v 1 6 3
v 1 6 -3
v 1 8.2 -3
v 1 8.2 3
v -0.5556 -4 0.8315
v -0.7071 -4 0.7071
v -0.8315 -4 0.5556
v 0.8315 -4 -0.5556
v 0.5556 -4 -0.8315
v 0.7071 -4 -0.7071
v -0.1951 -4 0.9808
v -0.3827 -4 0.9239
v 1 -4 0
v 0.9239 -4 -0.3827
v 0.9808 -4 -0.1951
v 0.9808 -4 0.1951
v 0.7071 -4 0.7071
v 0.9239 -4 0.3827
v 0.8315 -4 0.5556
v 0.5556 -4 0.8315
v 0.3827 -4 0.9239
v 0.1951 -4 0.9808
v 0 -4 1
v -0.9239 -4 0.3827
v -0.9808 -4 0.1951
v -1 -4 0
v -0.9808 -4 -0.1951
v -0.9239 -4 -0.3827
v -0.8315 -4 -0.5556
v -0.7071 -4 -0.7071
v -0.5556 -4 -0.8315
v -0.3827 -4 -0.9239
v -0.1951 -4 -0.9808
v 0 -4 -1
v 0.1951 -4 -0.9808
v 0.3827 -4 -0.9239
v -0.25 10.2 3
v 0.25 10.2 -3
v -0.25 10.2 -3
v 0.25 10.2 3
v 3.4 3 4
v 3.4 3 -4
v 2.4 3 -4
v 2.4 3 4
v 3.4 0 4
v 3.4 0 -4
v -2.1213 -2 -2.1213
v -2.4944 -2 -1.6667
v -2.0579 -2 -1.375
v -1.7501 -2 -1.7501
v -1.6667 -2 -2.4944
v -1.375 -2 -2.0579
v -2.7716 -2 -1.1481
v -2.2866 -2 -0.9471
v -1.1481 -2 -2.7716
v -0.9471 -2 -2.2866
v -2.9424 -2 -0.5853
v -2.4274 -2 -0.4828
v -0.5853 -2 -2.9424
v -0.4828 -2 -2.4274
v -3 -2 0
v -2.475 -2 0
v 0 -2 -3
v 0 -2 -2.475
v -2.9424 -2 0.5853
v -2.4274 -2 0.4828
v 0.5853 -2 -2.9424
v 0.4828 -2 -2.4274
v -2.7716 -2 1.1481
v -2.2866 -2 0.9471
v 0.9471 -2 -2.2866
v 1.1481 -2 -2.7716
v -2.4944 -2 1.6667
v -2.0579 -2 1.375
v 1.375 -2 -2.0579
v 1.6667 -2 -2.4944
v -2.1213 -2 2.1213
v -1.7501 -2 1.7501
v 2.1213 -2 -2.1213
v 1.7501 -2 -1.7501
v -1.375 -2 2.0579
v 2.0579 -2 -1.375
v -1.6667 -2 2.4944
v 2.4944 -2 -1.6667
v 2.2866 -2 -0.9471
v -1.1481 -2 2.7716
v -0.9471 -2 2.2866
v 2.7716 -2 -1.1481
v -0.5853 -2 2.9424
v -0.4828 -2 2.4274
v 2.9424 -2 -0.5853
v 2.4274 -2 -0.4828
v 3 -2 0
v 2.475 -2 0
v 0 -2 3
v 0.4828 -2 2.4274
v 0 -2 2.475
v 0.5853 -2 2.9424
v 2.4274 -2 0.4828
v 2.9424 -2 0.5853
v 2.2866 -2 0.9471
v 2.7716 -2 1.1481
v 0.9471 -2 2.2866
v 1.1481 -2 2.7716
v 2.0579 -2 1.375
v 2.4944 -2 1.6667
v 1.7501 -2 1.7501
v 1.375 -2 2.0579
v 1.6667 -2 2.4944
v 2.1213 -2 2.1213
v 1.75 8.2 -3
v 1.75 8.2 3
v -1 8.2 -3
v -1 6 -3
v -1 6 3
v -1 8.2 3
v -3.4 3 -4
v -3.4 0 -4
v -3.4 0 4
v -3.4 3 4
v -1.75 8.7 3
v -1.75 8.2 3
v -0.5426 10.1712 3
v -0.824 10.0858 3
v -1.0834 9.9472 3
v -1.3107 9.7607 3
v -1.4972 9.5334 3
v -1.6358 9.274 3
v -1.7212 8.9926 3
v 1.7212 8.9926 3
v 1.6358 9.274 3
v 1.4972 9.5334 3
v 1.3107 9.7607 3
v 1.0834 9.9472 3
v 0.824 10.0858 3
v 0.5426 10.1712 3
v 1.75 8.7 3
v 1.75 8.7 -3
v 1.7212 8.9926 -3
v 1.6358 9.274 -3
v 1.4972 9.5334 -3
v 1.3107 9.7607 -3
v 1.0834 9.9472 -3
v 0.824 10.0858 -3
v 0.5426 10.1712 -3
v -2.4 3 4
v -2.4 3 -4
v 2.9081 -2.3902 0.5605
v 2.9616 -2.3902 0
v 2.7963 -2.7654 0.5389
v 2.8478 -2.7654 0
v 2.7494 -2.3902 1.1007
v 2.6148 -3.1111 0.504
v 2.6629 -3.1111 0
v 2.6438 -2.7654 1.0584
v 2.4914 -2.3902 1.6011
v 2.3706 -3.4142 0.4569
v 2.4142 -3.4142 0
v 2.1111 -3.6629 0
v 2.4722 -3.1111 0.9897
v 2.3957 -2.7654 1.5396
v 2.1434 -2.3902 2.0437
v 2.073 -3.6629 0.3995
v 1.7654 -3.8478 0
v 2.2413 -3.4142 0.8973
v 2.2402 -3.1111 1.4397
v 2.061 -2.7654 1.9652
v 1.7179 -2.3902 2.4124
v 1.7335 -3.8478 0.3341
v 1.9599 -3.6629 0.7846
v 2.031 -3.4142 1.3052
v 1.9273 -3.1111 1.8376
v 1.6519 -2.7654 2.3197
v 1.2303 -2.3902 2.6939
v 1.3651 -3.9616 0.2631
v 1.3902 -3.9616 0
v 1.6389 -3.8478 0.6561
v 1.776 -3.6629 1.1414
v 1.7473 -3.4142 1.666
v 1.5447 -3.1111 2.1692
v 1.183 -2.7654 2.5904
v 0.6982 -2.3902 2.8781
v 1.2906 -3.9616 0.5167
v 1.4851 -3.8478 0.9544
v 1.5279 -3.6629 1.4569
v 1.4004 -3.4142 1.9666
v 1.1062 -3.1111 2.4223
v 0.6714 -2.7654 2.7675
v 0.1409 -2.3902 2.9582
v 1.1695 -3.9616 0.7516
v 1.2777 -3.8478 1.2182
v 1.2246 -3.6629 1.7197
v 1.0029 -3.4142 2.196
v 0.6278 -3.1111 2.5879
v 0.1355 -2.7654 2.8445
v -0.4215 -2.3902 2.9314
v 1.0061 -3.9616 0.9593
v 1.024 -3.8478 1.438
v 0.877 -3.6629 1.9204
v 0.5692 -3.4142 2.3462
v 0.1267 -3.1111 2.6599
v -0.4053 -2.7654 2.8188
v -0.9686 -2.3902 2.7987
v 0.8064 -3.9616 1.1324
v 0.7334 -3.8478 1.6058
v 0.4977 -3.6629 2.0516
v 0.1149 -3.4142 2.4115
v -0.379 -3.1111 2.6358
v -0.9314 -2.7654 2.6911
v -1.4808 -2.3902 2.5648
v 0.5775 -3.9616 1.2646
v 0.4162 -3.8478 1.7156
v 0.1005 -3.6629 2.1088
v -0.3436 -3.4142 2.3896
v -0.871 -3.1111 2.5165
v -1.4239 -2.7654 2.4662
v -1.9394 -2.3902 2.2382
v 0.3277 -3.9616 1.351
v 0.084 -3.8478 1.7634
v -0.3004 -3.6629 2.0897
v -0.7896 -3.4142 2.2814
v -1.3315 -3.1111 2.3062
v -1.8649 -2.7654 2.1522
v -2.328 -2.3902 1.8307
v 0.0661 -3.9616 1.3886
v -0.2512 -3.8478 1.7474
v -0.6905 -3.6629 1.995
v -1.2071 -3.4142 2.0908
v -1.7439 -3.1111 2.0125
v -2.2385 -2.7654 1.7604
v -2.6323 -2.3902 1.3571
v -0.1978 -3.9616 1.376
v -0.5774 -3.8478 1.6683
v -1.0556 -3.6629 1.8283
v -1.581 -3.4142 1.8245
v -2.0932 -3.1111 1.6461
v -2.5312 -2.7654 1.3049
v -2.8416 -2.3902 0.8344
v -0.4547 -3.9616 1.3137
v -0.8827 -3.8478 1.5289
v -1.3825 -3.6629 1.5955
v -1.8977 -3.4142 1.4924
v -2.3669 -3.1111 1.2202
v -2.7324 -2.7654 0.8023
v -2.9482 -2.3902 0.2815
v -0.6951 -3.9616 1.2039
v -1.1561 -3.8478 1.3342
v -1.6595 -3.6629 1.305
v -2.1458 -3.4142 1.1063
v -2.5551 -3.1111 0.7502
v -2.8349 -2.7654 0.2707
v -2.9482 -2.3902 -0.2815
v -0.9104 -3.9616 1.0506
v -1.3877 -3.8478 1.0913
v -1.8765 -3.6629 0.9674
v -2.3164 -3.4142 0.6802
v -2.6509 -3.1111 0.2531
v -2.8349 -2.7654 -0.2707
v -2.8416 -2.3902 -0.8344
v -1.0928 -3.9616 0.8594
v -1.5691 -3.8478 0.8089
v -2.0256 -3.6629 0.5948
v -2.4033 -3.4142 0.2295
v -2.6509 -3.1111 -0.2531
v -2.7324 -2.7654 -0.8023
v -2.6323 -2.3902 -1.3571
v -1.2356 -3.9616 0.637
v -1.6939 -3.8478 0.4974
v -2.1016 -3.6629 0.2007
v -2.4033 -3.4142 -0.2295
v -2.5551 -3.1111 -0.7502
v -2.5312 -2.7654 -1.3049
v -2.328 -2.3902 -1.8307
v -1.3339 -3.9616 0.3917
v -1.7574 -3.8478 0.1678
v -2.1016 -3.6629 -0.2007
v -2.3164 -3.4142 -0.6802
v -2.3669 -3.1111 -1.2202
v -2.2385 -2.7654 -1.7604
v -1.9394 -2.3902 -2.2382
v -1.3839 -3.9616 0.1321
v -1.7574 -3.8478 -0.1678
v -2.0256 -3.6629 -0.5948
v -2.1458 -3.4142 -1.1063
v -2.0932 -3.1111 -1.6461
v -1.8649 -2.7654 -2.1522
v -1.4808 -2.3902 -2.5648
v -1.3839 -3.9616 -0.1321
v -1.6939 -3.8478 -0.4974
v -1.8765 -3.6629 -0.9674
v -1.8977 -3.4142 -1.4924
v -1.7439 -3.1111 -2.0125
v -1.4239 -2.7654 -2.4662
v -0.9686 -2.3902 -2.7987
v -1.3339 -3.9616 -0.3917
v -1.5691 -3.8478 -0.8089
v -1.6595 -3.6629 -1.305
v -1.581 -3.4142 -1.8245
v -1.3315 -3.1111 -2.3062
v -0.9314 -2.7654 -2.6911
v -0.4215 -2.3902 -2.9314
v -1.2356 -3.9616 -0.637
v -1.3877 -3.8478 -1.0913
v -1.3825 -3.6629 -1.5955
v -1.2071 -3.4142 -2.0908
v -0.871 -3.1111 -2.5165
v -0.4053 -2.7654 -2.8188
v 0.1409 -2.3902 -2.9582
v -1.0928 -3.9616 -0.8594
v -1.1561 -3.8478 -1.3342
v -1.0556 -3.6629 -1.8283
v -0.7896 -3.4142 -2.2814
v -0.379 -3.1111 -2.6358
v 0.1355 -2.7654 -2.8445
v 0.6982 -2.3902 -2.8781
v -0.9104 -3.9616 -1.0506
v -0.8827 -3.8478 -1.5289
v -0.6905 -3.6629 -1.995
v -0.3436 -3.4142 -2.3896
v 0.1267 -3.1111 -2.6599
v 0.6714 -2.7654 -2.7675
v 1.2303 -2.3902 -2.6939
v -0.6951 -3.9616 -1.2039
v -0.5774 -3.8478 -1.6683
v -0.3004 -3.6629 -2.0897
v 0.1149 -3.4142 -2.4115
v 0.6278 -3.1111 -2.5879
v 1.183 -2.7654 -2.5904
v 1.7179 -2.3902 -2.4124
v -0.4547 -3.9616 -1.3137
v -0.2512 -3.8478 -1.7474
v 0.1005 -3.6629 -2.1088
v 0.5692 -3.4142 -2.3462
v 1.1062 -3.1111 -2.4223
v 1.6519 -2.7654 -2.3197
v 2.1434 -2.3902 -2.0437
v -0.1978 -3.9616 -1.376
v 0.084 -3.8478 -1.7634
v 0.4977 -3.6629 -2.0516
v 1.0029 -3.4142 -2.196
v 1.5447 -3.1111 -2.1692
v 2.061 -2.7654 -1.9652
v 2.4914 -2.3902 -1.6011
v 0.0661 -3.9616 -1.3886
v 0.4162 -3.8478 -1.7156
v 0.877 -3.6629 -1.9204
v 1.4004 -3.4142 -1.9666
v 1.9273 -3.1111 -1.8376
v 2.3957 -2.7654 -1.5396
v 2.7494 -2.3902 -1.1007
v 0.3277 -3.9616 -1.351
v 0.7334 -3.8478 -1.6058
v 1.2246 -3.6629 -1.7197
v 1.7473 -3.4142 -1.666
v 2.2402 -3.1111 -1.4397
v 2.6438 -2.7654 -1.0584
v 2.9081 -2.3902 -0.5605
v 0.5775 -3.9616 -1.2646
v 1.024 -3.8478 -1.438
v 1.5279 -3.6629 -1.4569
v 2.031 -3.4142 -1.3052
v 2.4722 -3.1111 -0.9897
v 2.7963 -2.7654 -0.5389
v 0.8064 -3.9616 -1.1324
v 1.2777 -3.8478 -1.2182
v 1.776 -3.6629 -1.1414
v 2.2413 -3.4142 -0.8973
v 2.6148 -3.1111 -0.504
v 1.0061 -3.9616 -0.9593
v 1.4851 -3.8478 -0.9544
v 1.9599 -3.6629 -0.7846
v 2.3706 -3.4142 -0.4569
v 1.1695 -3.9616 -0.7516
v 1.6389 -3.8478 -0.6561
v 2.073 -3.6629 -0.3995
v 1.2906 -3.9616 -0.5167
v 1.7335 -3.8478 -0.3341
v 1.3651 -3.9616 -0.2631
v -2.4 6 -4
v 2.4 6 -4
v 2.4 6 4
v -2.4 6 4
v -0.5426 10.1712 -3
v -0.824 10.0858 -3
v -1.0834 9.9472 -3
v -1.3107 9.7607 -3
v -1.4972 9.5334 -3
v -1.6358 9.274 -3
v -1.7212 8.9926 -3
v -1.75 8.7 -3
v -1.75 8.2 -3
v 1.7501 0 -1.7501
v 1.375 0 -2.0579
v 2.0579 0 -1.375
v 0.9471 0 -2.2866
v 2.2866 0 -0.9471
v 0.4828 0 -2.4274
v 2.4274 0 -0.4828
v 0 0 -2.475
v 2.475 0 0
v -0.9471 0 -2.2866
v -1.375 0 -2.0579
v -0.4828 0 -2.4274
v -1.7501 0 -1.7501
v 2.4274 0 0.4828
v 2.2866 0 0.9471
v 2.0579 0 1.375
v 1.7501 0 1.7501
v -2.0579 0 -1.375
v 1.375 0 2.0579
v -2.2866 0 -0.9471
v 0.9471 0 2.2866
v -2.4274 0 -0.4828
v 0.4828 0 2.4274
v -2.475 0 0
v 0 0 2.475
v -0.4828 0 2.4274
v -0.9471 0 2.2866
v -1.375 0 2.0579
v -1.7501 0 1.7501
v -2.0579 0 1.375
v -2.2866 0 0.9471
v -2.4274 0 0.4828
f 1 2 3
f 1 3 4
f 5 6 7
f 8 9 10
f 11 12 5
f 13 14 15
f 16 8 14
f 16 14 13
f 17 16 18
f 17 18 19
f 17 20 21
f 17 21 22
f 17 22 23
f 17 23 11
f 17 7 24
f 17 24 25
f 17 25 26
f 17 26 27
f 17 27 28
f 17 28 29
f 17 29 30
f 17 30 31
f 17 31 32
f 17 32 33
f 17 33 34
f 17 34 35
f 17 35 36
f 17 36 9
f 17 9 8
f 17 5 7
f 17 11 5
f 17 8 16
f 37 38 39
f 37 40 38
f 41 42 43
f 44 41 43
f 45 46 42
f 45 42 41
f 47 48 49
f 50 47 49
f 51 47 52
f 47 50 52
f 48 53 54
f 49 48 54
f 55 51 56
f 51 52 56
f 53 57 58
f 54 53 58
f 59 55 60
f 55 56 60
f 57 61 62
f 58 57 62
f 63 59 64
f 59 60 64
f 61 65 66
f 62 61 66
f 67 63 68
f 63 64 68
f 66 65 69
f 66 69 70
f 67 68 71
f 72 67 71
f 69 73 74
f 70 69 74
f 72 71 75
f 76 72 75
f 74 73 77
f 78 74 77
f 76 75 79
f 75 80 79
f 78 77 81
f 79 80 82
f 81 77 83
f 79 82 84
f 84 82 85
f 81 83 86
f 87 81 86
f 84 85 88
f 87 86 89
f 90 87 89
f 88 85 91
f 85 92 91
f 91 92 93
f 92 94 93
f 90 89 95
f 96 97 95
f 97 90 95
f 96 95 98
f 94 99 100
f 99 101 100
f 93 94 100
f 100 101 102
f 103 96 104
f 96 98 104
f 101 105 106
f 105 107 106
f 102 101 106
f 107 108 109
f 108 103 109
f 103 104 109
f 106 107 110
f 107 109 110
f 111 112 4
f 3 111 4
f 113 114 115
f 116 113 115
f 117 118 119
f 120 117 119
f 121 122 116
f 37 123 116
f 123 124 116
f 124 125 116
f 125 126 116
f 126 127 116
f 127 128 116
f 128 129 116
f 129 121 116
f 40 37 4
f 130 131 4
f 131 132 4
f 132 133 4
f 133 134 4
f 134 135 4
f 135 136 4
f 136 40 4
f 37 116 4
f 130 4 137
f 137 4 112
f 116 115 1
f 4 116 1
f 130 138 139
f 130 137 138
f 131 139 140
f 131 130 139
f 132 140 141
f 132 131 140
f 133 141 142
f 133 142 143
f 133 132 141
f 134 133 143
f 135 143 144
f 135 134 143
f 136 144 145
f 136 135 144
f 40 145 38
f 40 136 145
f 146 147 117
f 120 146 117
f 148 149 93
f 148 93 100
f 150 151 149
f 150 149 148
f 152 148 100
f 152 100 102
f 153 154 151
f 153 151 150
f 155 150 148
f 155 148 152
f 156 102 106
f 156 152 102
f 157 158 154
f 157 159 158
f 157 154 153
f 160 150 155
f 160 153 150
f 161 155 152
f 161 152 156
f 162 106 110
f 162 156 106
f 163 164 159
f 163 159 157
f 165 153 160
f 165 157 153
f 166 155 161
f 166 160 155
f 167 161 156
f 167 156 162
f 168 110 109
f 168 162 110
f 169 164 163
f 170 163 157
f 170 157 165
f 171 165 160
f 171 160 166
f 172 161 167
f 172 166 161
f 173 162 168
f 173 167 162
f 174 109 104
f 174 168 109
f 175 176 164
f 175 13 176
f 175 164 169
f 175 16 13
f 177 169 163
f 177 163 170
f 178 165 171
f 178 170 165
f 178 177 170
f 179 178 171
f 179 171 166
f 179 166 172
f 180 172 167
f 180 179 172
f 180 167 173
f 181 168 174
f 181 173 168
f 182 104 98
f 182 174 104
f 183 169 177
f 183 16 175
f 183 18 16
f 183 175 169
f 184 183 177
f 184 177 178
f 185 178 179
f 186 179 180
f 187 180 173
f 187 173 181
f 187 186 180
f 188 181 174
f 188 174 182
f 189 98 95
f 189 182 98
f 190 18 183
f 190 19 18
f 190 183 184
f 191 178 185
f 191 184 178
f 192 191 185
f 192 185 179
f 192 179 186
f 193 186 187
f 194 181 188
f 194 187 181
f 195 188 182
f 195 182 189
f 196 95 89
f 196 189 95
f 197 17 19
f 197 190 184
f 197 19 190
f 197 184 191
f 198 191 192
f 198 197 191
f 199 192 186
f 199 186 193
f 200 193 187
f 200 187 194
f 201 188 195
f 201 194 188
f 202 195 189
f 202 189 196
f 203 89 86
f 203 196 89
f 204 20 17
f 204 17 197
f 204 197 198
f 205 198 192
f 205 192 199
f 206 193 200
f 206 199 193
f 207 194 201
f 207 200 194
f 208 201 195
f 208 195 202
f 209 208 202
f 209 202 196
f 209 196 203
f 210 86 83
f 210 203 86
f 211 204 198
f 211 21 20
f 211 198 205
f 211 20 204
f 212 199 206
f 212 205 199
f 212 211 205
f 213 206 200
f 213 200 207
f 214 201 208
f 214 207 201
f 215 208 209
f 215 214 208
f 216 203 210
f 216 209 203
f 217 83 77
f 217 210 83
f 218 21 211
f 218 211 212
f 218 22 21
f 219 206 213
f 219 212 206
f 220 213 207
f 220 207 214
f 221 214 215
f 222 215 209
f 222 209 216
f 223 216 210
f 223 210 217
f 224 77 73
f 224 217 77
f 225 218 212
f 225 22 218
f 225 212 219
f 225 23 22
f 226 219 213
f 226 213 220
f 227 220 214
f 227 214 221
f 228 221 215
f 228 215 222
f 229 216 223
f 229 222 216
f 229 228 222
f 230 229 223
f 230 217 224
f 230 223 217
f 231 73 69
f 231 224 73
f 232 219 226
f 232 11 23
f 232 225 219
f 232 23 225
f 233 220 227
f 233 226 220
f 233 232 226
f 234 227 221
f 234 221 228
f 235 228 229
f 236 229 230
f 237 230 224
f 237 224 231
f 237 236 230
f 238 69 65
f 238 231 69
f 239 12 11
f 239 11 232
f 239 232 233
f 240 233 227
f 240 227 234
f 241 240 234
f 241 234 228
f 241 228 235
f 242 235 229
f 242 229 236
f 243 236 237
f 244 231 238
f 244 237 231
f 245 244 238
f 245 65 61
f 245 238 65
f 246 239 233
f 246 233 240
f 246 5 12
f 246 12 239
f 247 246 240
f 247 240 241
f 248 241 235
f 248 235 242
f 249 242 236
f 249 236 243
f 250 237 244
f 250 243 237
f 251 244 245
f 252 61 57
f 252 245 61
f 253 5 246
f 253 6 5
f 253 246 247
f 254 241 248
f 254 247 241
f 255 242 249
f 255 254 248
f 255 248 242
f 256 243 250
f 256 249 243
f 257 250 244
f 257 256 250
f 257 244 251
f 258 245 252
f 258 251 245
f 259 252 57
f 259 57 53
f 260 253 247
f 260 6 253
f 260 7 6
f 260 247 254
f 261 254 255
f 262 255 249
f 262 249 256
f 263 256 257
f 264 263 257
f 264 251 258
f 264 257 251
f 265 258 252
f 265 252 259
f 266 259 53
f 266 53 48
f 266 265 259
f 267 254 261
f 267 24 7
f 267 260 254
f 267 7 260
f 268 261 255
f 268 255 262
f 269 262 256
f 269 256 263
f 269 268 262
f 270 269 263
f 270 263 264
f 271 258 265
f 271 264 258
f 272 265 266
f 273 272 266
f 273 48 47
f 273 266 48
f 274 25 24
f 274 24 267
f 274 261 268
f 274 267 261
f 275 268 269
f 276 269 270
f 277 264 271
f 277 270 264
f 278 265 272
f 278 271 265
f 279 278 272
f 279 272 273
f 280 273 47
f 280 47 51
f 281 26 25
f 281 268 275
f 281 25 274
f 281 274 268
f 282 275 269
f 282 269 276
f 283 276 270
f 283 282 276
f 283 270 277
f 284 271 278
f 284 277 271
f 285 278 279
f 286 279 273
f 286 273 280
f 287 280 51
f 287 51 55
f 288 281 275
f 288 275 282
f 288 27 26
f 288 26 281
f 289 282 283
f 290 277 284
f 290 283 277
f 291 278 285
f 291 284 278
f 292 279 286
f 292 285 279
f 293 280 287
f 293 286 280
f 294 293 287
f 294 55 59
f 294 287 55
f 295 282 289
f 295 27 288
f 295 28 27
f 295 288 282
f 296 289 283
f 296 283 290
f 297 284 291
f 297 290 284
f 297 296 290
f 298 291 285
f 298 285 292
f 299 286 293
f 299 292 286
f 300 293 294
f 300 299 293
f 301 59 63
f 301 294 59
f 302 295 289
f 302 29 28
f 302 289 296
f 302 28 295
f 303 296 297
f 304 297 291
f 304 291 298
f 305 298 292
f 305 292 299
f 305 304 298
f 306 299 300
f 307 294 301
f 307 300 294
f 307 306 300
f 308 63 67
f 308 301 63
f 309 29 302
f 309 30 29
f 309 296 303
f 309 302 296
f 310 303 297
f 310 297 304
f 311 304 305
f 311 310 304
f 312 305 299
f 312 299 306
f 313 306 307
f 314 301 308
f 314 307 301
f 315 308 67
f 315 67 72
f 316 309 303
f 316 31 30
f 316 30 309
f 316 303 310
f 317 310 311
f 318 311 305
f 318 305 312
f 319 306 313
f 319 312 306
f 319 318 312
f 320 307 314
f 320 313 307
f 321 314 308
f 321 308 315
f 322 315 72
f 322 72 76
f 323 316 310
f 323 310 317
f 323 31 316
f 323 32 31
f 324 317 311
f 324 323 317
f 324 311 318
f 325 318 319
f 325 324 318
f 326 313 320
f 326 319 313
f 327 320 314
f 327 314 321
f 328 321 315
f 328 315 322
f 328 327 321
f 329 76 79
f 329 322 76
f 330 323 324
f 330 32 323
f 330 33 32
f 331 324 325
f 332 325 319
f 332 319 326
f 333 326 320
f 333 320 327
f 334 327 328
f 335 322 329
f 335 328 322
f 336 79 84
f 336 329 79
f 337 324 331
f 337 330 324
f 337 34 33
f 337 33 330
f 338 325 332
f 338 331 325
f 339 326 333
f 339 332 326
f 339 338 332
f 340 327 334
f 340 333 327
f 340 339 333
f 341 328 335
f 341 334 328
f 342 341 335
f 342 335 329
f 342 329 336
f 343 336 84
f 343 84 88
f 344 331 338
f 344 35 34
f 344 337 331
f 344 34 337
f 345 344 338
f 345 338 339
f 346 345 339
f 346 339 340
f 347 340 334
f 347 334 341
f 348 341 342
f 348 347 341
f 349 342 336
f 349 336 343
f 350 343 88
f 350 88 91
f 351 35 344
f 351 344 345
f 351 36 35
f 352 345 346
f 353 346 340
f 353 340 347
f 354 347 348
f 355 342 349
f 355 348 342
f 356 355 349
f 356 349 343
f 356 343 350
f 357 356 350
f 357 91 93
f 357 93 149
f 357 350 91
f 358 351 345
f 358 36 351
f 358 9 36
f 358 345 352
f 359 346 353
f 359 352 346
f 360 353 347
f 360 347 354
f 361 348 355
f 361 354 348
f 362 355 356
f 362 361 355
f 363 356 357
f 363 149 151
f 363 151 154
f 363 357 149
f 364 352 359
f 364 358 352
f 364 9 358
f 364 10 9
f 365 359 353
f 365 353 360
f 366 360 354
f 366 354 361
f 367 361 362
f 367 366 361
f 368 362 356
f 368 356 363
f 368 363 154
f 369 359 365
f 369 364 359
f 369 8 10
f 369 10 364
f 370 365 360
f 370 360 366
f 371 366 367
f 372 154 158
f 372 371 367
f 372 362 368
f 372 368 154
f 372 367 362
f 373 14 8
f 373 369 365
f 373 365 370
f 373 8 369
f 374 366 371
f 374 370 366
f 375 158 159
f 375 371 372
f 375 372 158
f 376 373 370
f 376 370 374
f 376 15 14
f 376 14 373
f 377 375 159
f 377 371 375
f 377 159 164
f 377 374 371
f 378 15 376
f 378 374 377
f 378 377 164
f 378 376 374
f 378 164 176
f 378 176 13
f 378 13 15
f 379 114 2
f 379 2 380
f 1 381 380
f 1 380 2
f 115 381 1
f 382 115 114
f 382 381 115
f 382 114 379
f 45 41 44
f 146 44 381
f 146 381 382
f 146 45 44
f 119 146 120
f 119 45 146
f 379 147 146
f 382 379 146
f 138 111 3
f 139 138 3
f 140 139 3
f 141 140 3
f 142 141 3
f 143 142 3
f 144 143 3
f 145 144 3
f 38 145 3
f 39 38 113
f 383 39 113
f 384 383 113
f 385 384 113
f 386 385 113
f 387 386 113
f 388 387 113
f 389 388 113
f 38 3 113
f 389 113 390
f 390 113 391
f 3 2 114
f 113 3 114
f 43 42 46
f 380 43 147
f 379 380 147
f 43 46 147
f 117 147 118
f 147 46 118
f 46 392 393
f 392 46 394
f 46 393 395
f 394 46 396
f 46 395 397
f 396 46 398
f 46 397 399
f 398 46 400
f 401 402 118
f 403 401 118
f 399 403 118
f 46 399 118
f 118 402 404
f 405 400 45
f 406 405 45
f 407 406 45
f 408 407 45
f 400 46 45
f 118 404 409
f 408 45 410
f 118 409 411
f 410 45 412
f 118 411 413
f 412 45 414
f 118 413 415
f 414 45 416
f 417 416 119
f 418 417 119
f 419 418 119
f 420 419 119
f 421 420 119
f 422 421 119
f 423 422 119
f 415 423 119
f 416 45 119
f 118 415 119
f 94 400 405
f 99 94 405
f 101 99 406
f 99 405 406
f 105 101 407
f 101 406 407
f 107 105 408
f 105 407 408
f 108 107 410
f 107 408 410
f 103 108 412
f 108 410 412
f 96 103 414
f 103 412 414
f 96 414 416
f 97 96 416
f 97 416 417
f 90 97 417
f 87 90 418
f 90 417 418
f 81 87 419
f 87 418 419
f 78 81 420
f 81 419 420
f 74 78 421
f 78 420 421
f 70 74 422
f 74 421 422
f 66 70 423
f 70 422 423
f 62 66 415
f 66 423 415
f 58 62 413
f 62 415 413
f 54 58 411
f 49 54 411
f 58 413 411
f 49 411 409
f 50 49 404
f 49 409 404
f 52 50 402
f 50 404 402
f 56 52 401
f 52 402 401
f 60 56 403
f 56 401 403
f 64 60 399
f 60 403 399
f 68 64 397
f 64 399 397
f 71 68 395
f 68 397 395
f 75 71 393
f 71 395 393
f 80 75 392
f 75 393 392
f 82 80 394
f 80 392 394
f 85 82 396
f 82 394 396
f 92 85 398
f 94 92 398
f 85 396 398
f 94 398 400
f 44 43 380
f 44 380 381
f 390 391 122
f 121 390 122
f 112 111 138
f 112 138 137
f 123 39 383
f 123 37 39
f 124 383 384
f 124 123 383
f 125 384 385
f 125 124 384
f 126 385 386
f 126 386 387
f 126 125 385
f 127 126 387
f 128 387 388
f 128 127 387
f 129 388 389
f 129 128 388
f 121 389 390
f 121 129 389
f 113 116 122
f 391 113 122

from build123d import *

# Parameters (mm, degrees)
F0_R      = 2.475
F1_DEPTH  = 2
F2_R      = 3
F3_DEPTH  = 2
F4_R      = 1.99999
F5_W      = 6.8
F5_H      = 8
F5_R      = 2.475
F6_DEPTH  = 3
F7_W      = 4.8
F7_H      = 8
F8_DEPTH  = 3
F9_W      = 2
F9_H      = 6
F10_DEPTH = 2.2
F11_W     = 0.75
F11_H     = 6
F11_W_2   = 2
F12_DEPTH = 2
F13_R     = 1.5


# Not quite as in the source:
# - a fillet or chamfer is up to 0.001 mm smaller than in the source, because OpenCascade refuses the exact size


with BuildPart() as f1:
    # F0 (on Front) → F1 (new body)
    with BuildSketch(Plane.XZ):
        Circle(F0_R)
    extrude(amount=F1_DEPTH)

    # F2 (on face) → F3 (join)
    with BuildSketch(Plane.XZ.offset(2)):
        Circle(F2_R)
    extrude(amount=F3_DEPTH)

    # F4 (radius 2 in the source; OpenCascade refuses exactly that, so slightly less here)
    f4_edges = [f1.edges().sort_by_distance(p)[0] for p in [
        (-3, -4, 0),
    ]]
    fillet(f4_edges, radius=F4_R)

    # F5 (on face) → F6 (join)
    with BuildSketch(Plane(origin=(0, 0, 0), x_dir=(-1, 0, 0), z_dir=(0, 1, 0))):
        Rectangle(F5_W, F5_H)
        Circle(F5_R, mode=Mode.SUBTRACT)
        Circle(F5_R)
    extrude(amount=F6_DEPTH)

    # F7 (on face) → F8 (join)
    with BuildSketch(Plane(origin=(0, 3, 0), x_dir=(-1, 0, 0), z_dir=(0, 1, 0))):
        Rectangle(F7_W, F7_H)
    extrude(amount=F8_DEPTH)

    # F9 (on face) → F10 (join)
    with BuildSketch(Plane(origin=(0, 6, 0), x_dir=(-1, 0, 0), z_dir=(0, 1, 0))):
        Rectangle(F9_W, F9_H)
    extrude(amount=F10_DEPTH)

    # F11 (on face) → F12 (join)
    with BuildSketch(Plane(origin=(0, 8.2, 0), x_dir=(-1, 0, 0), z_dir=(0, 1, 0))):
        with Locations((-1.375, 0)):
            Rectangle(F11_W, F11_H)
        Rectangle(F11_W_2, F11_H)
        with Locations((1.375, 0)):
            Rectangle(F11_W, F11_H)
    extrude(amount=F12_DEPTH)

    # F13
    f13_edges = [f1.edges().sort_by_distance(p)[0] for p in [
        (1.75, 10.2, 0),
        (-1.75, 10.2, 0),
    ]]
    fillet(f13_edges, radius=F13_R)


solid = f1.part
